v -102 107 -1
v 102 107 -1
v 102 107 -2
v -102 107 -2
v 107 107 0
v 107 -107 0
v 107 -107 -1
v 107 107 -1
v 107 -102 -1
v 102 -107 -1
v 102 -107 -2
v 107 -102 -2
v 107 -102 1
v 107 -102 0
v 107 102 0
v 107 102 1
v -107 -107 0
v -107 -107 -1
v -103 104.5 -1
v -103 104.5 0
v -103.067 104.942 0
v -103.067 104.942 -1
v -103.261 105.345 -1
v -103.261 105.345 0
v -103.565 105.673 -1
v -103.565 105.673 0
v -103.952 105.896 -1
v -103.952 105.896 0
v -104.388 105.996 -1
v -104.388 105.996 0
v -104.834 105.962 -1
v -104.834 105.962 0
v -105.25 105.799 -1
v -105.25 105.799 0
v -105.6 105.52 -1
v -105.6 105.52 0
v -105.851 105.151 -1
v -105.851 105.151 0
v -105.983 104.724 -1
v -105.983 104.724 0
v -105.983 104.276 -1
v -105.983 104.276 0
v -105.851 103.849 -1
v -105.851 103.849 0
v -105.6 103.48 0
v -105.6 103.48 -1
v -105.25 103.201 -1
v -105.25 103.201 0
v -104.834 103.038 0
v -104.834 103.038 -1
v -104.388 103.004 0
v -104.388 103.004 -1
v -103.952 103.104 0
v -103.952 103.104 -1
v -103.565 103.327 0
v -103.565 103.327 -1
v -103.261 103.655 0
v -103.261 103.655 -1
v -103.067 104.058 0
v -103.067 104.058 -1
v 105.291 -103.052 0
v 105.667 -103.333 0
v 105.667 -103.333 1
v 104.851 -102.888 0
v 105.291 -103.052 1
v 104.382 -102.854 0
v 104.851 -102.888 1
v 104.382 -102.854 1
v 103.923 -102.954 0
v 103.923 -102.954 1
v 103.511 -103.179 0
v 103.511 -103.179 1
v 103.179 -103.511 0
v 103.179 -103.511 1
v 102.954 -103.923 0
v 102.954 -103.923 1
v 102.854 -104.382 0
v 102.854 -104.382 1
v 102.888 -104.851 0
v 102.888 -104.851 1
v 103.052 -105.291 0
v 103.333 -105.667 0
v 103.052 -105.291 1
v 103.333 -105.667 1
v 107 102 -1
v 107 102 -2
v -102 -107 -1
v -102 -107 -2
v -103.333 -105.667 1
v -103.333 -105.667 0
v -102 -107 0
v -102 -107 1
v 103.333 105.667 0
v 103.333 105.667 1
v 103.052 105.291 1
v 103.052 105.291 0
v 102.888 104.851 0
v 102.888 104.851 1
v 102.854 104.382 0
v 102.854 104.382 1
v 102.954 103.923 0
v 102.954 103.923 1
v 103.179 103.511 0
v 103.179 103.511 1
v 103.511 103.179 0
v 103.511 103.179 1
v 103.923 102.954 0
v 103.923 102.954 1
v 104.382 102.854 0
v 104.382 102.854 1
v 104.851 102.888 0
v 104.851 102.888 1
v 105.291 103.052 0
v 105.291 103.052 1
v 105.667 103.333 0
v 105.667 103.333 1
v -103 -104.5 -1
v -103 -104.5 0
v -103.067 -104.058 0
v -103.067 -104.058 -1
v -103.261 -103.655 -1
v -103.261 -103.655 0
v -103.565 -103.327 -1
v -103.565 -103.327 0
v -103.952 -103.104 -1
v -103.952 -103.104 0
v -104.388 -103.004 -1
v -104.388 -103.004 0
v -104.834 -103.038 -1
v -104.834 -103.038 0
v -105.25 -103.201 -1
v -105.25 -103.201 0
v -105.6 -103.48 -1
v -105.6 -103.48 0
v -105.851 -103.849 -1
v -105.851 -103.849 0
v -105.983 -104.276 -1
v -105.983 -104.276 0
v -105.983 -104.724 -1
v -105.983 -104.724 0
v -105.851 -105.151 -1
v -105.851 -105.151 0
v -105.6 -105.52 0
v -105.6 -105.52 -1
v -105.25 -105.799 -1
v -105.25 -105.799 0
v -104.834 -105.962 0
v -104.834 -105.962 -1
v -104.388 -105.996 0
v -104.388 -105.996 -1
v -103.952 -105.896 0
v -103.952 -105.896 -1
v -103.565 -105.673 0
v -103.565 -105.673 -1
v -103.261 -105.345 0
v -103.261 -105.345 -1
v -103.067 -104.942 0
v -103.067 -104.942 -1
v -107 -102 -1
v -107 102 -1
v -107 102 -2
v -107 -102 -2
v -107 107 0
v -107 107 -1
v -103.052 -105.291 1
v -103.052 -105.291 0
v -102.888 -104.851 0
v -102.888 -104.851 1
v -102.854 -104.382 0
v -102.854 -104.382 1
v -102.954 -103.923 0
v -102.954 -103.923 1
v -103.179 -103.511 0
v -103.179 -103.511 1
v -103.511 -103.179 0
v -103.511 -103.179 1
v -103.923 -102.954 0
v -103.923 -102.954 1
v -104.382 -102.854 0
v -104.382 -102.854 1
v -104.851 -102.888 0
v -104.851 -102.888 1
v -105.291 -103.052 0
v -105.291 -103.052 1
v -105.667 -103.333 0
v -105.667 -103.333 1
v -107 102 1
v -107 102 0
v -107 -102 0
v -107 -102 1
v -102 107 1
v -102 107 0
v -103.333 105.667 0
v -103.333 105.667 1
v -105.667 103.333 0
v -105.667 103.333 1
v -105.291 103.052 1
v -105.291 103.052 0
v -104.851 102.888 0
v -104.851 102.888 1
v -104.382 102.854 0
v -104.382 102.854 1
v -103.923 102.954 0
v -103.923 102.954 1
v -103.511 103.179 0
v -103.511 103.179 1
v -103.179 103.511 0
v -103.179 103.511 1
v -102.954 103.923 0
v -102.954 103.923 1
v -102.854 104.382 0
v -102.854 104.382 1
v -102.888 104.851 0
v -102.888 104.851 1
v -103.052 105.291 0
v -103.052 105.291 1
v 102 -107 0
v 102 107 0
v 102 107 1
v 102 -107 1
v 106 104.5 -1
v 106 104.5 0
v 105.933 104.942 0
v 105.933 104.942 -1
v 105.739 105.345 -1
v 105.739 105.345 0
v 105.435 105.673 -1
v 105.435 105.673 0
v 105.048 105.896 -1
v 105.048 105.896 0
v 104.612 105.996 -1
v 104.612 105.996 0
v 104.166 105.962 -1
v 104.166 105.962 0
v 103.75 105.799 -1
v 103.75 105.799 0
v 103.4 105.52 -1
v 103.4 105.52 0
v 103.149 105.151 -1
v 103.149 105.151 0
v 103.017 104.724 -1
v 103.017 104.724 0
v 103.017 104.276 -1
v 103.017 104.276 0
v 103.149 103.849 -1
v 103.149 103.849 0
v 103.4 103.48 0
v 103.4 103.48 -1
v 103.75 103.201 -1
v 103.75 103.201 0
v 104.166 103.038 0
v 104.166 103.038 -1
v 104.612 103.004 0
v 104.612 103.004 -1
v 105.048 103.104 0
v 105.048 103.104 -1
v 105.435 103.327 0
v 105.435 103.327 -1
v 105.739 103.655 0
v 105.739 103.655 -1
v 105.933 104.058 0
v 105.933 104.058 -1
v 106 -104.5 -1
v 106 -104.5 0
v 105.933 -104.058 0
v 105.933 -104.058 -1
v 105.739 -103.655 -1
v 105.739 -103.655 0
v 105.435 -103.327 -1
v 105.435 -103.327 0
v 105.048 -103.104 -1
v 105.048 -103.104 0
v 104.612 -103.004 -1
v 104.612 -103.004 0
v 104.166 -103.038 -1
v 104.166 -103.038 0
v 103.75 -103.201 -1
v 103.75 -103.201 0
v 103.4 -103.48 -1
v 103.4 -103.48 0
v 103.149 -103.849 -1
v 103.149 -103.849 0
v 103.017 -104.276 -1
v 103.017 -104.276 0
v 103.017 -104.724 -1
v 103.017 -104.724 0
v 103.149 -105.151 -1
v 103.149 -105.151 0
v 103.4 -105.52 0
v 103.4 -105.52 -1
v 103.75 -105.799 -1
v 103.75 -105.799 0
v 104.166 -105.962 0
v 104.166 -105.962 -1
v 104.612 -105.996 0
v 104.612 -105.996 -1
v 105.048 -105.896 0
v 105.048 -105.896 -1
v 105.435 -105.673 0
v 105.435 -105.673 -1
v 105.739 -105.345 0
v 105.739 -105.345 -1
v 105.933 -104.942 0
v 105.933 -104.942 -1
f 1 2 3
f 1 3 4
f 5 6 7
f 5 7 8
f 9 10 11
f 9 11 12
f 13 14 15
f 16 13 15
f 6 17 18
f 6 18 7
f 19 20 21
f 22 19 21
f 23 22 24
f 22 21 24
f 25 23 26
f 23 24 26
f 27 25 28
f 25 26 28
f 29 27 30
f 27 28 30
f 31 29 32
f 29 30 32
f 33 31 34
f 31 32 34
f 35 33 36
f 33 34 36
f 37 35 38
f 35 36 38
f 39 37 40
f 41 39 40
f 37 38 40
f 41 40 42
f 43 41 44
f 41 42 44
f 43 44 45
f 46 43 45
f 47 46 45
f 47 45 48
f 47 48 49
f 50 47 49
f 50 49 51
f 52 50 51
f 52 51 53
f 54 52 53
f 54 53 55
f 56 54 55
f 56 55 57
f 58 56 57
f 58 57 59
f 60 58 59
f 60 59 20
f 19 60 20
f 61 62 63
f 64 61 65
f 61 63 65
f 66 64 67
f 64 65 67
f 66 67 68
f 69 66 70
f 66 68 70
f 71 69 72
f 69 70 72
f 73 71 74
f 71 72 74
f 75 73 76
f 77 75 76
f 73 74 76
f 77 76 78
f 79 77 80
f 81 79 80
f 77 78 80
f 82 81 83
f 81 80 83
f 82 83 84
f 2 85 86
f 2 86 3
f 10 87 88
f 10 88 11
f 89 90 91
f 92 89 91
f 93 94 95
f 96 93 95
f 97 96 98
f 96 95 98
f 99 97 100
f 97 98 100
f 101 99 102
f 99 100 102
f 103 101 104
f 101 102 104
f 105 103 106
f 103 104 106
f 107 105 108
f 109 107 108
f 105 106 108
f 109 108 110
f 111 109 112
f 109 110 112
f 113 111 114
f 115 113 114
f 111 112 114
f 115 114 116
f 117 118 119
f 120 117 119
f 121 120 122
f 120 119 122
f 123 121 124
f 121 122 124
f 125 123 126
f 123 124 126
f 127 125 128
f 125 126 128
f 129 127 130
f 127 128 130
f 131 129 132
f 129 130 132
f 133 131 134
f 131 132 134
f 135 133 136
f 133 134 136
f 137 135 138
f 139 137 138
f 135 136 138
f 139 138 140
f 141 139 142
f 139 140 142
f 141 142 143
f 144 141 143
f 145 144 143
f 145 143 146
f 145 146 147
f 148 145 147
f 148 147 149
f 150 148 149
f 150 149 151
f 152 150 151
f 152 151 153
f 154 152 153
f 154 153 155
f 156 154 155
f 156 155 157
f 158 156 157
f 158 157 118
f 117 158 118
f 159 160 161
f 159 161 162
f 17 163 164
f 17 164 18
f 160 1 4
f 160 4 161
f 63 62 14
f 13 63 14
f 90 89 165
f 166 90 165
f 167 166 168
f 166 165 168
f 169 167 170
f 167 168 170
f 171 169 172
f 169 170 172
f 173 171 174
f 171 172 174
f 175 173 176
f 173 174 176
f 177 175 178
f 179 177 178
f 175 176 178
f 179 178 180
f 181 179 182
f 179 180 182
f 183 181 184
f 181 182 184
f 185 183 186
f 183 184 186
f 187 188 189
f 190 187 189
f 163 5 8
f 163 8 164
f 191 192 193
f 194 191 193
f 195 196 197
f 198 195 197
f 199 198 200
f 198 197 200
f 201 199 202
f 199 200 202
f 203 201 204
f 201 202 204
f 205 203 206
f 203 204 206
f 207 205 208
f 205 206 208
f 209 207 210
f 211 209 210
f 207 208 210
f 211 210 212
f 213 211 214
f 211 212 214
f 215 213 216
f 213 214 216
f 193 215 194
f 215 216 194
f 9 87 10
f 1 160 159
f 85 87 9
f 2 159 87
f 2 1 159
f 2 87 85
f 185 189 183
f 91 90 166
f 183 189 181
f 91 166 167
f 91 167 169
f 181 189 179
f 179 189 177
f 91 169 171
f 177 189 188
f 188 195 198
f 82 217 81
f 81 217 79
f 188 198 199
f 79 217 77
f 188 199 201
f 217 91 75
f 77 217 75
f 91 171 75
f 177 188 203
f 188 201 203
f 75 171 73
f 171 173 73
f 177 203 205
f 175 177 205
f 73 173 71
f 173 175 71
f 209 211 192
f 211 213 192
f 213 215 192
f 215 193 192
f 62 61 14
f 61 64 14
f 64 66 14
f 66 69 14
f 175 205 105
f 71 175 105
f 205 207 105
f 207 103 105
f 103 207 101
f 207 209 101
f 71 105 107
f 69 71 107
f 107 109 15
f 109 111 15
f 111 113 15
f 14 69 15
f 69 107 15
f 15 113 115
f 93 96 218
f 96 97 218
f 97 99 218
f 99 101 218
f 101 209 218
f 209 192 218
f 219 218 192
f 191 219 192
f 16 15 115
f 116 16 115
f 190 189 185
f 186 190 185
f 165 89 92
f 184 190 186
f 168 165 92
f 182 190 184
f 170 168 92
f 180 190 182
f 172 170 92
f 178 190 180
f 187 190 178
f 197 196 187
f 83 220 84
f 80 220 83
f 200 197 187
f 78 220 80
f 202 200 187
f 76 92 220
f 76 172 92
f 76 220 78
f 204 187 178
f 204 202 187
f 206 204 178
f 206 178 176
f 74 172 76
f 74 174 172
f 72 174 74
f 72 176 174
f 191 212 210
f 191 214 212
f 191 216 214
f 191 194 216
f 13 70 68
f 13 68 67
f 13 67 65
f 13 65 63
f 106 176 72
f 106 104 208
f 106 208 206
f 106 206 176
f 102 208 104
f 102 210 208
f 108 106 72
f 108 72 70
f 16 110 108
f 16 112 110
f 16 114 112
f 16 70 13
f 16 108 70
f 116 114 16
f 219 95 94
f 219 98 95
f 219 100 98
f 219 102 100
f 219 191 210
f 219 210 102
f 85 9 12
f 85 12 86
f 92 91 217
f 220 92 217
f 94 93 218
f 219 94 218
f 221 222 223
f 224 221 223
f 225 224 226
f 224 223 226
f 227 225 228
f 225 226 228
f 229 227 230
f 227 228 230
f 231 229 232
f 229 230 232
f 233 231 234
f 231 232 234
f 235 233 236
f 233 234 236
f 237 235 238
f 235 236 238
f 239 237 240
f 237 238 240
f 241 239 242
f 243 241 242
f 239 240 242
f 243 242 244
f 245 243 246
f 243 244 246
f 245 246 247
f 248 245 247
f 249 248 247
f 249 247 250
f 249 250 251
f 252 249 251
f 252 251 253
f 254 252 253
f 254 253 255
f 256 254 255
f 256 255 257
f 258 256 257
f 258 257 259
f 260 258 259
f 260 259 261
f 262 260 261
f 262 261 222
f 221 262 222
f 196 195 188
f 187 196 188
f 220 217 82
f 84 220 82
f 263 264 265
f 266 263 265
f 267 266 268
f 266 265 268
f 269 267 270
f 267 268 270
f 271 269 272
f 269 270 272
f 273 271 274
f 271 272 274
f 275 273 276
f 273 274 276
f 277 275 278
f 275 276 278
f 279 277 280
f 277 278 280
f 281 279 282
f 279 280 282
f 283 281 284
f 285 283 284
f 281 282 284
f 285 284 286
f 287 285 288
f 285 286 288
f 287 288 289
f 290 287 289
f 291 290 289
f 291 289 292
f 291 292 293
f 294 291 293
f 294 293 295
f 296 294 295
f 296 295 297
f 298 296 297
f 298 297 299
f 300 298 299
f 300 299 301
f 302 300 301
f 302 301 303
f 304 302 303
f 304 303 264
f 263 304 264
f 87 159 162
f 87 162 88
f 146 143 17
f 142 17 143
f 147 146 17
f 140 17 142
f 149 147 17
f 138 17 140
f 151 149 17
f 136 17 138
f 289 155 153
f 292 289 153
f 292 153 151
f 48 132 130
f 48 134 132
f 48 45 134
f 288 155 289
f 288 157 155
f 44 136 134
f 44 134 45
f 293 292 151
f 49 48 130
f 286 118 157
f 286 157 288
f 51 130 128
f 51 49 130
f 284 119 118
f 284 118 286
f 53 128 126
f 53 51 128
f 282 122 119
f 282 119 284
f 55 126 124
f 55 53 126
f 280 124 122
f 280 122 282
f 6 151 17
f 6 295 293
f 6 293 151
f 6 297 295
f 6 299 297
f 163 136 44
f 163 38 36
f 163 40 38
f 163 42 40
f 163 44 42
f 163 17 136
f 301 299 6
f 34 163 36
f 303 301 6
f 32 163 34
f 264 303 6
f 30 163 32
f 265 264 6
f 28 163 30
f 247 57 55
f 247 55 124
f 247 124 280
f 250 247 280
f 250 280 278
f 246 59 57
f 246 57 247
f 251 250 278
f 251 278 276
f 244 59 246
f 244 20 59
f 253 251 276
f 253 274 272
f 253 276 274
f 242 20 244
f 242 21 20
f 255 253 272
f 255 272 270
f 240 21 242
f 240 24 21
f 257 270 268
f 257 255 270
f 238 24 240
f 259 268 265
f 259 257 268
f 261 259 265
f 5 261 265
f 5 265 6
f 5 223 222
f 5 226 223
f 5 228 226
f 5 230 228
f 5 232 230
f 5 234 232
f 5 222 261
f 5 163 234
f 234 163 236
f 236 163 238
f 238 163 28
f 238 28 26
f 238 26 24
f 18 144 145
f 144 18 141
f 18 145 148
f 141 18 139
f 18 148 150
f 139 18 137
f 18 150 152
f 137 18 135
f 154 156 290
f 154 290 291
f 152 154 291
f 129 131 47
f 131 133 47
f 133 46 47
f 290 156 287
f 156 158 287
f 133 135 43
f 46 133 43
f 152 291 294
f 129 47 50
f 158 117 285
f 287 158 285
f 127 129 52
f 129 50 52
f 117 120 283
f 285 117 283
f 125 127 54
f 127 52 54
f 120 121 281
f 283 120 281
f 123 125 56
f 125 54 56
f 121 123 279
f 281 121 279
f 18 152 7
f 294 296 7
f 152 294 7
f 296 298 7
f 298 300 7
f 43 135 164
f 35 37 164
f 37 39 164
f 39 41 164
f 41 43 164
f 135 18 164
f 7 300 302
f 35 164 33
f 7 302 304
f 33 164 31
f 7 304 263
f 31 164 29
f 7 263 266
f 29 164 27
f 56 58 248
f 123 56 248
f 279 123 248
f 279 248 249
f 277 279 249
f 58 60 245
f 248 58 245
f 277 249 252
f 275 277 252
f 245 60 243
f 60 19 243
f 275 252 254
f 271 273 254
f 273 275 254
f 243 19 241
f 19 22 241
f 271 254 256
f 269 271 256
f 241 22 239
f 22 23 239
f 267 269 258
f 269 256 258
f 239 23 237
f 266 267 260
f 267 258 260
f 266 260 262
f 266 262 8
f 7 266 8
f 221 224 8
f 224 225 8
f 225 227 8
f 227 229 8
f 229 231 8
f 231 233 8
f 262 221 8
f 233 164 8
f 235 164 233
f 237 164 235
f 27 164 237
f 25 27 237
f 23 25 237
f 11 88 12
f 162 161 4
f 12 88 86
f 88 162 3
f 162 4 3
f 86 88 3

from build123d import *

# Parameters (mm, degrees)
F1_DEPTH = 1
F2_DEPTH = 1
F3_D     = 3
F3_DEPTH = 1.001
F4_START = -1
F4_DEPTH = 1
F6_D     = 3.3


with BuildPart() as f1:
    # F0 (on Top) → F1 (new body)
    with BuildSketch(Plane.XY):
        Polygon((107, 102), (102, 107), (-102, 107), (-107, 102), (-107, -102), (-102, -107), (102, -107), (107, -102), align=None)
    extrude(amount=F1_DEPTH)

    # F6 (through all)
    with Locations(Plane(origin=(0, 0, 0), x_dir=(1, 0, 0), z_dir=(0, 0, -1))):
        with Locations((-104.5, 104.5), (-104.5, -104.5), (104.5, -104.5), (104.5, 104.5)):
            Hole(F6_D / 2)


with BuildPart() as f2:
    # F0 (on Top) → F2 (new body)
    with BuildSketch(Plane.XY):
        Polygon((-102, -107), (-107, -102), (-107, -107), align=None)
        Polygon((107, 102), (102, 107), (-102, 107), (-107, 102), (-107, -102), (-102, -107), (102, -107), (107, -102), align=None)
        Polygon((107, -107), (107, -102), (102, -107), align=None)
        Polygon((107, 102), (107, 107), (102, 107), align=None)
        Polygon((-107, 102), (-102, 107), (-107, 107), align=None)
    extrude(amount=-F2_DEPTH)

    # F3 (through all, one way)
    with BuildSketch(Plane.XY):
        with Locations((-104.5, 104.5), (-104.5, -104.5), (104.5, -104.5), (104.5, 104.5)):
            Circle(F3_D / 2)
    extrude(amount=-F3_DEPTH, mode=Mode.SUBTRACT)


with BuildPart() as f4:
    # F0 (on Top) → F4 (new body)
    with BuildSketch(Plane.XY.offset(F4_START)):
        Polygon((107, 102), (102, 107), (-102, 107), (-107, 102), (-107, -102), (-102, -107), (102, -107), (107, -102), align=None)
    extrude(amount=-F4_DEPTH)


solid = Compound([f1.part, f2.part, f4.part])
